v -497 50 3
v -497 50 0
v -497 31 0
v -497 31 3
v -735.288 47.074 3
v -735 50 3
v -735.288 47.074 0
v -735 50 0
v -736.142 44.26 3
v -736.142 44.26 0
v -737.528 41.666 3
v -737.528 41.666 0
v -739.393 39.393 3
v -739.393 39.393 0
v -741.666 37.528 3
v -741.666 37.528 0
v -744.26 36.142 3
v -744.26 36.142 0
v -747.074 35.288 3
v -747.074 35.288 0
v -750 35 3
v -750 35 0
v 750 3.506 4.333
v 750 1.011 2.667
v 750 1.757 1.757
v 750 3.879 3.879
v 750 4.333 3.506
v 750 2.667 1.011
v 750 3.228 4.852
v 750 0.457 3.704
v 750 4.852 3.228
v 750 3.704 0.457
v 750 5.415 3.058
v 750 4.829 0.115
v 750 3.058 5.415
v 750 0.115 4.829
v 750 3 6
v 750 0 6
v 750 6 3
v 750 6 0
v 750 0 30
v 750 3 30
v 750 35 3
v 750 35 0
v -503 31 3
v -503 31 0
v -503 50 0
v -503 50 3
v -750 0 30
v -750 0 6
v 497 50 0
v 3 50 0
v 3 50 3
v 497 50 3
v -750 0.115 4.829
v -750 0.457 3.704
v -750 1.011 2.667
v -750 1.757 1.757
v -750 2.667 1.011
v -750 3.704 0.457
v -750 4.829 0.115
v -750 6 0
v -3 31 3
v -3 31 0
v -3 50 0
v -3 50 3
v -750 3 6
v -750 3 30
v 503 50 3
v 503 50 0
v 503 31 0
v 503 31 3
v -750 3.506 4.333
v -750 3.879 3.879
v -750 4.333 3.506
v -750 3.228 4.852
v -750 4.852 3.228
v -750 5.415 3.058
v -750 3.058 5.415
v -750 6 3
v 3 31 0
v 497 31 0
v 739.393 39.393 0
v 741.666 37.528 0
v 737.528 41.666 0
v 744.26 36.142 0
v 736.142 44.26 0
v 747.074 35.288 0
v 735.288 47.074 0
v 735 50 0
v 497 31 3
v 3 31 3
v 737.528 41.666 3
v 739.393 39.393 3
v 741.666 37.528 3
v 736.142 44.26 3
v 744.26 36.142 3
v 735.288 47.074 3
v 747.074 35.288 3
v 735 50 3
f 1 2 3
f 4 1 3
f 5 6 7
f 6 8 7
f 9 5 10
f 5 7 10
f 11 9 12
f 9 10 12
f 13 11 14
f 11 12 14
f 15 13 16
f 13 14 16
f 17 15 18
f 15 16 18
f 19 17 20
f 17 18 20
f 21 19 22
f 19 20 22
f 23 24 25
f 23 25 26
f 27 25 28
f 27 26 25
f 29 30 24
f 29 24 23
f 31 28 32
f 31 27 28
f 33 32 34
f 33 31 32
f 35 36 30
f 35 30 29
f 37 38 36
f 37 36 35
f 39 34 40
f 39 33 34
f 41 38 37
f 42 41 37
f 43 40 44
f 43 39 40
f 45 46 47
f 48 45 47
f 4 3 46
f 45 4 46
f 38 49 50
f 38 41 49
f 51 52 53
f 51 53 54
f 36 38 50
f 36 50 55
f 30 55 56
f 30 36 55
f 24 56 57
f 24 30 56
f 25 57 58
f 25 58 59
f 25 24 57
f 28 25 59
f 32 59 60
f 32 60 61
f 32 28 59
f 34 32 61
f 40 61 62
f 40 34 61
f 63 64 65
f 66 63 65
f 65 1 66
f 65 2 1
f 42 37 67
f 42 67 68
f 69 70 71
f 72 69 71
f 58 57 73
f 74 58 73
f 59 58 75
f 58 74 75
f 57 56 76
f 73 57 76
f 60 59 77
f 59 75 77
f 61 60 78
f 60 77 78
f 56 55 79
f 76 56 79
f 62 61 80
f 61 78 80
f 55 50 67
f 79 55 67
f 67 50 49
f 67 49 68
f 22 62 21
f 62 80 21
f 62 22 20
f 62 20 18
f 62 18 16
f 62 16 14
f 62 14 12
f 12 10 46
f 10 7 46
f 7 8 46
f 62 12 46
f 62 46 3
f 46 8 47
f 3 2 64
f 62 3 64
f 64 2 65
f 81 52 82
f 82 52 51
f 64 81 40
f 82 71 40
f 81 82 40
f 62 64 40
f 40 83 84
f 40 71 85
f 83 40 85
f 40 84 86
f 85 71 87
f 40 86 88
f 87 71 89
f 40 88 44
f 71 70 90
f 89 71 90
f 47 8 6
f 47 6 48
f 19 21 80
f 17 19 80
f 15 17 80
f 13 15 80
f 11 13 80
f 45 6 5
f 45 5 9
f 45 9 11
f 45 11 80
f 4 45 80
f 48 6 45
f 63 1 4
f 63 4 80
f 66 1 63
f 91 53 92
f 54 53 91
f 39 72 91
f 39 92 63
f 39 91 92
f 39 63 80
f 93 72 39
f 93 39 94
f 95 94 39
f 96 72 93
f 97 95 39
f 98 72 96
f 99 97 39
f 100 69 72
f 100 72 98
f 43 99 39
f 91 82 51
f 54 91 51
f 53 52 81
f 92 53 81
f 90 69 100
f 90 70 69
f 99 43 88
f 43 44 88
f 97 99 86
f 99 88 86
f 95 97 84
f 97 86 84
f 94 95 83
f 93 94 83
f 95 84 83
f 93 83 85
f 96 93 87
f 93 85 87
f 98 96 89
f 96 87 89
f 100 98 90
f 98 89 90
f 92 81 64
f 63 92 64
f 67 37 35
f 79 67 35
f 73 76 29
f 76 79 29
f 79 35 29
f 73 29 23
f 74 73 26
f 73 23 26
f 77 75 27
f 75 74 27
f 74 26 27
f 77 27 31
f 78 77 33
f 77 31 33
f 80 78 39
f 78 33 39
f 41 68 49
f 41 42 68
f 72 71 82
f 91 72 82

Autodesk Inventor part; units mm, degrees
ref_plane "YZ Plane" through (0, 0, 0) normal (1, 0, 0) x (0, 1, 0)
ref_plane "XZ Plane" through (0, 0, 0) normal (0, 1, 0) x (-1, 0, 0)
ref_plane "XY Plane" through (0, 0, 0) normal (0, 0, 1) x (1, 0, 0)
sketch "Sketch1" plane through (0, 0, 0) normal (0, 0, 1) x (1, 0, 0)
  line L0 (-750, 50) -> (750, 50)
  line L1 (750, 50) -> (750, 0)
  line L2 (750, 0) -> (-750, 0)
  line L3 (-750, 0) -> (-750, 50)
  point P0 (0, 0)
  point P1 (0, 0)
  dimension "d0" = 1500
  dimension "d1" = 50
extrude "Plate1" add sketch "Sketch1" along normal blind 3
sketch "Sketch2" plane through (750, 3, 0) normal (0, -1, 0) x (1, 0, 0)
  line L0 (-1500, 0) -> (0, 0)
  line L1 (0, 0) -> (0, 30)
  line L2 (0, 30) -> (-1500, 30)
  line L3 (-1500, 30) -> (-1500, 0)
edge flange "Flange1" height 30 angle 90 thickness 3 bend radius 3 thickness toward (0, -1, 0) relief tear relief width 3 relief depth 1.5 edges at (0, 0, 3) wall of the first edge with corners at (-750, 3, 0) (750, 3, 0) (750, 3, 30) (-750, 3, 30)
bend "Bend1"
corner "Corner1"
sketch "Sketch5" plane through (0, 0, 0) normal (0, 0, -1) x (-1, 0, 0)
  line L0 (750, 50) -> (-750, 50) projected
  line L1 (497, 50) -> (497, 31)
  line L2 (497, 31) -> (500, 31)
  line L3 (500, 31) -> (500, 50) construction
  line L4 (750, 0) -> (-750, 0) projected
  line L5 (500, 31) -> (503, 31)
  line L6 (503, 31) -> (503, 50)
  point P0 (0, 0)
  dimension "d18" = 3
  dimension "d19" = 250
  dimension "d20" = 31
  dimension "d27" = 3
extrude "Extrusion1" cut sketch "Sketch5" against normal through all
pattern_linear "Rectangular Pattern1" count 3 spacing 500 along (1, 0, 0) of "Extrusion1"
sketch "Sketch6" plane through (0, 0, 0) normal (0, 0, -1) x (-1, 0, 0)
  line L0 (-750, 50) -> (-750, 6) projected
  circle A0 centre (-750, 50) radius 15
  line L1 (-750, 50) -> (750, 50) projected
  point P0 (0, 0)
  point P1 (-503, 50)
  point P2 (-735, 50)
  point P3 (-750, 35)
  dimension "d24" = 30
extrude "Extrusion2" cut sketch "Sketch6" against normal through all contours L1 A0 L0 picked at (-740.1254, 48.8874)
mirror "Mirror1" about plane through (0, 0, 0) normal (1, 0, 0) of "Extrusion2"
equation "\"d1\" = Стрингер_1"
equation "\"d18\" = Thickness"
equation "\"d27\" = d18"
equation "\"d2\" = Thickness"
equation "\"d3\" = BendReliefWidth"
equation "\"d4\" = BendReliefDepth"
equation "\"d5\" = MinimumRemnant"
equation "\"d6\" = TransitionRadius"
equation "\"d9\" = BendRadius"
equation "\"d10\" = CornerReliefSize"
equation "\"d11\" = GapSize"
equation "\"d12\" = JacobiRadiusSize"
equation "\"BendRadius\" = Thickness"
equation "\"BendReliefWidth\" = Thickness"
equation "\"BendReliefDepth\" = 0.5 * Thickness"
equation "\"CornerReliefSize\" = 4 * Thickness"
equation "\"MinimumRemnant\" = 2 * Thickness"
equation "\"TransitionRadius\" = BendRadius"
equation "\"JacobiRadiusSize\" = BendRadius"
equation "\"GapSize\" = Thickness"
equation "\"qqqqqq\" = 67.35706"
equation "\"Стрингер_1\" = 50"
equation "\"Thickness\" = 3"
properties part number "МОО 051 стрингер спина 12"
